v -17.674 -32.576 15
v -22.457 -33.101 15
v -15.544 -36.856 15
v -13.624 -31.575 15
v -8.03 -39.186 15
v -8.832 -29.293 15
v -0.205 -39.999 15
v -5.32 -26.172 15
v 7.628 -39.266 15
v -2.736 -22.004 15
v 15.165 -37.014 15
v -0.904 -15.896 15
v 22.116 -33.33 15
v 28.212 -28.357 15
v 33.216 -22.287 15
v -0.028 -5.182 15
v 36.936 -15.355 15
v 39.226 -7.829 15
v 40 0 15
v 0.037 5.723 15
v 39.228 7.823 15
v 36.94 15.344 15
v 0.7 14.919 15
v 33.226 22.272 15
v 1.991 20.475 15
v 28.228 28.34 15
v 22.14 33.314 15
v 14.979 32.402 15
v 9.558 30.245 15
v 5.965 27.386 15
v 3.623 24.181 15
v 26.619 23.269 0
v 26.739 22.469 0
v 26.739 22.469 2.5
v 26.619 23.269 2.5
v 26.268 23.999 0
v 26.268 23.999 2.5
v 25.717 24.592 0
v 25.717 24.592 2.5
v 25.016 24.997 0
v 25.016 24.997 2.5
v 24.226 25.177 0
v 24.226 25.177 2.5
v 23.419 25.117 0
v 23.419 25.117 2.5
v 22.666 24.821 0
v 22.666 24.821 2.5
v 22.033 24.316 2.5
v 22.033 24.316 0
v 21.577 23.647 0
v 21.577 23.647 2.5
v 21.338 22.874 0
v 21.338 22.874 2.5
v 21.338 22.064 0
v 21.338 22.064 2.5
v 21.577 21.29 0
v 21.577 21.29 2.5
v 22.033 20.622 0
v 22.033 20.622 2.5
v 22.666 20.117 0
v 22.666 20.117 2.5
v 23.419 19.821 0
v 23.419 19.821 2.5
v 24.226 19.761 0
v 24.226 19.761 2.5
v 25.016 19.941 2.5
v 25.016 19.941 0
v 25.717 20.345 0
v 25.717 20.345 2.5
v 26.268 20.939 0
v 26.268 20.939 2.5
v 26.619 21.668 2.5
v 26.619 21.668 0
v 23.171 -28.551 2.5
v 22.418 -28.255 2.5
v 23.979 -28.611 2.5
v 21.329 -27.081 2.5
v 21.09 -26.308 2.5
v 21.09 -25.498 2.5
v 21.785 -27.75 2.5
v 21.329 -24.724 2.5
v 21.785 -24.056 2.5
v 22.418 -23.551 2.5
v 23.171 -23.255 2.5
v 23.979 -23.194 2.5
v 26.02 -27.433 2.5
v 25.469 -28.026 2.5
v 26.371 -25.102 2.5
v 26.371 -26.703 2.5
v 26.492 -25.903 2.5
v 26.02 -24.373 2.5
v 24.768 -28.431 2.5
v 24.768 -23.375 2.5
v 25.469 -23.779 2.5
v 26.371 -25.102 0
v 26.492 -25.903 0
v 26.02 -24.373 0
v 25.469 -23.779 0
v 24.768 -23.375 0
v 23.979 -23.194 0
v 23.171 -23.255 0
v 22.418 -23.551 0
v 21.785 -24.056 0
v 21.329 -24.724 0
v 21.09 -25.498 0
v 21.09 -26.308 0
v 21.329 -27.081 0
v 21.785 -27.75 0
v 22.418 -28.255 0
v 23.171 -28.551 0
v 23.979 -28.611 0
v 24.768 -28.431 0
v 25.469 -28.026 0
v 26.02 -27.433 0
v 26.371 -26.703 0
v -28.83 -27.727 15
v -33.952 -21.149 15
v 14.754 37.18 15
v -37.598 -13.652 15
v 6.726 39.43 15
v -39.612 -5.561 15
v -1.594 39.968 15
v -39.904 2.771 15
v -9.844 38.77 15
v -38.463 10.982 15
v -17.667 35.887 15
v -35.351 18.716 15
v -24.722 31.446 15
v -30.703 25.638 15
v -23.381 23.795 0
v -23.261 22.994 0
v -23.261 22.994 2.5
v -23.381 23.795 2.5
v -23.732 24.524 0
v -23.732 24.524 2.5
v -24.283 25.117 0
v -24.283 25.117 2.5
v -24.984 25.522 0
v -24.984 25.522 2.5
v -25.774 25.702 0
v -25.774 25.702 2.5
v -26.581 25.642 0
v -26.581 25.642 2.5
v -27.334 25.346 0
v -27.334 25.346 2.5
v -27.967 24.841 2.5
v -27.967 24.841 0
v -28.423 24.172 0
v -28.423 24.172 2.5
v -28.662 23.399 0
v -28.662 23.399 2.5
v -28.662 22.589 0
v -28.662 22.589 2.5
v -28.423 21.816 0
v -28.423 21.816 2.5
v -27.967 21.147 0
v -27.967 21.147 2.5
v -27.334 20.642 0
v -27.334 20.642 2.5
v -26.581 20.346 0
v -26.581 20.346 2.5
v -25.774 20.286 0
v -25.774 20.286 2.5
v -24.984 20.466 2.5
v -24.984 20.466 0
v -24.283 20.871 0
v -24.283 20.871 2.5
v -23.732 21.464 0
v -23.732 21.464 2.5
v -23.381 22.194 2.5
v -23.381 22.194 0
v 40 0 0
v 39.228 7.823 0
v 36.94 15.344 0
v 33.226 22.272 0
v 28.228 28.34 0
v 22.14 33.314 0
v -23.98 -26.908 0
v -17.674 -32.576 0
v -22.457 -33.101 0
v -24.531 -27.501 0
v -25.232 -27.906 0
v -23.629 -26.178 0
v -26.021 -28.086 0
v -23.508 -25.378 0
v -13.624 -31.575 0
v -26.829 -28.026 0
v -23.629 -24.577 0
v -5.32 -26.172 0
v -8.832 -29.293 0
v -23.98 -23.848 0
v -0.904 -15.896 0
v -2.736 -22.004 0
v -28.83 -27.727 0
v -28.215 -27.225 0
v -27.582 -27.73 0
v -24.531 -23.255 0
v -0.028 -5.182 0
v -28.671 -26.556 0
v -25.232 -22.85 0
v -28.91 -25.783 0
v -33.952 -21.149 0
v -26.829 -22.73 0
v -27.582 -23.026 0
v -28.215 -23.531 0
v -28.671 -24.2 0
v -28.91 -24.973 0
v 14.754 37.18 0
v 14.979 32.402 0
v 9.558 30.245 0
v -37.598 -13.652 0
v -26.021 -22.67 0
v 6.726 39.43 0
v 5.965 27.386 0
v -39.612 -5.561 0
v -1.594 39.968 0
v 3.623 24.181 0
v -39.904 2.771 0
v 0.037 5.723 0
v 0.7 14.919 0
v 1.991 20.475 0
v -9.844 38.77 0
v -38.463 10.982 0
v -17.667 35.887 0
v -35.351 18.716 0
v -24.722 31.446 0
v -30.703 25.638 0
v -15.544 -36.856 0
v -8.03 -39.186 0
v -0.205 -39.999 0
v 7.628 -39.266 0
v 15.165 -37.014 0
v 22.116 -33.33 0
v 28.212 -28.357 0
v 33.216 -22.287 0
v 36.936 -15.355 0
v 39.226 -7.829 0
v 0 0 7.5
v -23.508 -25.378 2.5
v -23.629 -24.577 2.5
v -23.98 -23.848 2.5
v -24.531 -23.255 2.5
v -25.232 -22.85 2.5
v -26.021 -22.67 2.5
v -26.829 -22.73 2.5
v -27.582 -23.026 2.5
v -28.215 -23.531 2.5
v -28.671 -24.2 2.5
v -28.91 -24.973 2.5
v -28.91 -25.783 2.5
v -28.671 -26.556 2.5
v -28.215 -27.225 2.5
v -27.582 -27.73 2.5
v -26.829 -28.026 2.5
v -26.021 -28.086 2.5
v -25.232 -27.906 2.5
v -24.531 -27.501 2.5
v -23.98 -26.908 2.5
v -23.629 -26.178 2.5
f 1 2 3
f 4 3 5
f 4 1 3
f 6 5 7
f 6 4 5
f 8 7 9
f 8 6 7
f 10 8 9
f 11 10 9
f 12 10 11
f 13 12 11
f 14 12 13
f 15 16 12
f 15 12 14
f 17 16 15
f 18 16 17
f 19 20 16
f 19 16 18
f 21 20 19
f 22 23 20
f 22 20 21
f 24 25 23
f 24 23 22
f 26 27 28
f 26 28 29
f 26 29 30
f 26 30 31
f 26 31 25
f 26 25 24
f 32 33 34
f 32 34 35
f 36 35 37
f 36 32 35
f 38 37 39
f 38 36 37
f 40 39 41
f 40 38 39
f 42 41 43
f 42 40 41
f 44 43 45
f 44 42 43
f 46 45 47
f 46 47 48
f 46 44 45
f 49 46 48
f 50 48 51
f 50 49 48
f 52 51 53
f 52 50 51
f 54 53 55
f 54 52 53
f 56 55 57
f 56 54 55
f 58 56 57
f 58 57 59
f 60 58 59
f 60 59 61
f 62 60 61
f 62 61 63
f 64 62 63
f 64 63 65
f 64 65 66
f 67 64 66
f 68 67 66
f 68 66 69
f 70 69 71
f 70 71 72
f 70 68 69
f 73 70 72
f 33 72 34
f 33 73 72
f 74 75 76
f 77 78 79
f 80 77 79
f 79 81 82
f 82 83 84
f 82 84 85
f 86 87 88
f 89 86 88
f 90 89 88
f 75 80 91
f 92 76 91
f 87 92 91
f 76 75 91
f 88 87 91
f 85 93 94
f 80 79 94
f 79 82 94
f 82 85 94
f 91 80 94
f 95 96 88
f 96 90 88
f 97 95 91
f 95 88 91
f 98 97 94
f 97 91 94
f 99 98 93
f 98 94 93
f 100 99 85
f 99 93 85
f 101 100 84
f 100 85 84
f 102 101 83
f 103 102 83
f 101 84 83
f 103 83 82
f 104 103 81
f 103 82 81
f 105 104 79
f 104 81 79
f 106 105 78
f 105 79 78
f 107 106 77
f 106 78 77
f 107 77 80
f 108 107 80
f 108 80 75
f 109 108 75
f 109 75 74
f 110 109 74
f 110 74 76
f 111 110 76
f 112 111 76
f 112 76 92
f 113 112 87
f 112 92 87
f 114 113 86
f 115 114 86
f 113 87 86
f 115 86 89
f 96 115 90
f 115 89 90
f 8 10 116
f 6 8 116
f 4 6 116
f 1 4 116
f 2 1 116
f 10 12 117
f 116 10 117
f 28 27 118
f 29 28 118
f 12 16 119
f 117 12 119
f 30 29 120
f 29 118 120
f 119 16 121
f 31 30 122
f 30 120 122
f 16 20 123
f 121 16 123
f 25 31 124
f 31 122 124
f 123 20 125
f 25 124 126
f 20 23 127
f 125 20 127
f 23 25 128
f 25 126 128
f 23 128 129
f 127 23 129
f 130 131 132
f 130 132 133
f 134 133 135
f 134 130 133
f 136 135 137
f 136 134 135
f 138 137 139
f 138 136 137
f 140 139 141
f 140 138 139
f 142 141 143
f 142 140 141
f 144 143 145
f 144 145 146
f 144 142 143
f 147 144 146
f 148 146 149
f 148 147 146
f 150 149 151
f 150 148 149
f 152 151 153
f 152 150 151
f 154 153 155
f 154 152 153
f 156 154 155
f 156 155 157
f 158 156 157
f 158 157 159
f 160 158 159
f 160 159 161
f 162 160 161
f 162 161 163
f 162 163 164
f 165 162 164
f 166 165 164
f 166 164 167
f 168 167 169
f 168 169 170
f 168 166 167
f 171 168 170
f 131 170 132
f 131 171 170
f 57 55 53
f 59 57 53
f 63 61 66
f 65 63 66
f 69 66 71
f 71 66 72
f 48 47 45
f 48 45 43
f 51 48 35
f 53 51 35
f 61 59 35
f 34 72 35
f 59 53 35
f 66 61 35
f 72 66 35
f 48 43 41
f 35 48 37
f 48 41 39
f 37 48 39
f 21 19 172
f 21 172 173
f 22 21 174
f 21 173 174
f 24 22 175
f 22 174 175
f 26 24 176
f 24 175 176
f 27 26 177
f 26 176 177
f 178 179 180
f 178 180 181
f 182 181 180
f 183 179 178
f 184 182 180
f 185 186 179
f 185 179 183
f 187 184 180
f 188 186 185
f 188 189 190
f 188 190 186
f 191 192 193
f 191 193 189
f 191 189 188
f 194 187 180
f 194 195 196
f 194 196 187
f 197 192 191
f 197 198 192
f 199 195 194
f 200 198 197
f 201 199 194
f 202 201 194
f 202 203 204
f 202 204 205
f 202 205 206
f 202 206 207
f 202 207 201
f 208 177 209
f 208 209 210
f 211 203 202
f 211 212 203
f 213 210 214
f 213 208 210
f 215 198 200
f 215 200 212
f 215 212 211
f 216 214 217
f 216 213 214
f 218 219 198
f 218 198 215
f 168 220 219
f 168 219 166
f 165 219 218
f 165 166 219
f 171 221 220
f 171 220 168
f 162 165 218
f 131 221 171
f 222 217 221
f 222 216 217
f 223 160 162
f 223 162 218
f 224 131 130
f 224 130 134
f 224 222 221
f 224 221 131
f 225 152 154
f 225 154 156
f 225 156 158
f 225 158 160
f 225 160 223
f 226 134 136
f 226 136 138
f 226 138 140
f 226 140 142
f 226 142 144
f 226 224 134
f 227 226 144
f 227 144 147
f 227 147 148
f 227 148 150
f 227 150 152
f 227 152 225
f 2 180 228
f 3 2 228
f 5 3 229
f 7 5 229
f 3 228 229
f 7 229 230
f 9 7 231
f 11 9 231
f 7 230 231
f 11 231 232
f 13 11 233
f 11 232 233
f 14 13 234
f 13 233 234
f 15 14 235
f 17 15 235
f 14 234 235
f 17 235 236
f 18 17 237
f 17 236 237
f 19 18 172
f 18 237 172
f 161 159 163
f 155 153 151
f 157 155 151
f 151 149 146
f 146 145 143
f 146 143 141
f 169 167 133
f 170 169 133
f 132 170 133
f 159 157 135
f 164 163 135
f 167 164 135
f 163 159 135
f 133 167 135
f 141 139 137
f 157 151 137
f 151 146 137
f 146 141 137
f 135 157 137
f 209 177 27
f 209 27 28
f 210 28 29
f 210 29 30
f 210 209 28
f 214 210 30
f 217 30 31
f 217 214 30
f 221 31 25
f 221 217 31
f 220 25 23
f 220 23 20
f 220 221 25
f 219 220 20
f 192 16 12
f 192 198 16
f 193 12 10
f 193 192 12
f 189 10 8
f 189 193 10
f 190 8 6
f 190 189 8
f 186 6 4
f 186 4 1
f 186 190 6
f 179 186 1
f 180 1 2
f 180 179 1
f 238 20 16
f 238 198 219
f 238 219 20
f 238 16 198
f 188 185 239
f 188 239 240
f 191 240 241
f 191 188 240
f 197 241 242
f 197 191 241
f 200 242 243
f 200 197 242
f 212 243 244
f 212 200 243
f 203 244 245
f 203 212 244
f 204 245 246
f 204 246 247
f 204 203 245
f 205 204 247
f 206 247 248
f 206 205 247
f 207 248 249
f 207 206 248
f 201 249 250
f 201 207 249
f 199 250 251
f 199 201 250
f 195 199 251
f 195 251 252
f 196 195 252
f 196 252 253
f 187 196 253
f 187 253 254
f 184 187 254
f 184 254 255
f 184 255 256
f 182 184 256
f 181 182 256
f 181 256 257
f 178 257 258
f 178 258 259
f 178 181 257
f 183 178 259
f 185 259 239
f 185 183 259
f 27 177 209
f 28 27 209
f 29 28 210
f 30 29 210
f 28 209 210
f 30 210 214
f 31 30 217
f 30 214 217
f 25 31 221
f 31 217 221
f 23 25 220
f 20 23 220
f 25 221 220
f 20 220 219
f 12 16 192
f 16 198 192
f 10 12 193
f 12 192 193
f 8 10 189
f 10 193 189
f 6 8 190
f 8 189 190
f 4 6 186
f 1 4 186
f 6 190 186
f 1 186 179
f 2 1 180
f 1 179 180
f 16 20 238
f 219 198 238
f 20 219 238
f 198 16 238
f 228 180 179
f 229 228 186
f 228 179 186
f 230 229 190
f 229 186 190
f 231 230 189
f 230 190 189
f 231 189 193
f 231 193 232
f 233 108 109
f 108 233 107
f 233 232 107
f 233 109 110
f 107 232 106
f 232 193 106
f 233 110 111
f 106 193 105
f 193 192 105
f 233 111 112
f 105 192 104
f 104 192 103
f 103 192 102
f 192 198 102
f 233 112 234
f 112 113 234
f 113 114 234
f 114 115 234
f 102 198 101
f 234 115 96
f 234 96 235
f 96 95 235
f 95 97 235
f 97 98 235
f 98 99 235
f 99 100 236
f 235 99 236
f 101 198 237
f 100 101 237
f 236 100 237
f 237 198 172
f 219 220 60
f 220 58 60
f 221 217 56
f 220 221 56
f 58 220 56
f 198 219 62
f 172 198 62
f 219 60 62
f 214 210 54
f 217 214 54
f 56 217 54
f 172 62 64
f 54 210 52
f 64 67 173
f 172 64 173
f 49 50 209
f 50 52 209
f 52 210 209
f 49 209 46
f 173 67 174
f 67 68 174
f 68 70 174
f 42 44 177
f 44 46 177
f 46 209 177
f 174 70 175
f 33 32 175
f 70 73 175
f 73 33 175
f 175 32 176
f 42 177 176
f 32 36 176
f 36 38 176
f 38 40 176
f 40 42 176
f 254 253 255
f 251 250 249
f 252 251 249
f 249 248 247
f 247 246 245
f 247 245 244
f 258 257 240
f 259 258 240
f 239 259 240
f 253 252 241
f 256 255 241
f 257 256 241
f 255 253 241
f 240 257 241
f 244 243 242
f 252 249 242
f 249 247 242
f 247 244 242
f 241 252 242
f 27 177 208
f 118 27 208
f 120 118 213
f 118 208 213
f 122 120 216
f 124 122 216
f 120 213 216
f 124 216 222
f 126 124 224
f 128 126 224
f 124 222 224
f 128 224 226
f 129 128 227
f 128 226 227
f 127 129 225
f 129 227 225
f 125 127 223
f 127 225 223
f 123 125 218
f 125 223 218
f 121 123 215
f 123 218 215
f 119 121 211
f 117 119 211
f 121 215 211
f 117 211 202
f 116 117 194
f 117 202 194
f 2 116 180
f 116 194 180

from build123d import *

# Parameters (mm, degrees)
F1_DEPTH = 15
F2_DEPTH = 15
F3_R     = 2.7159146739
F4_DEPTH = 2.5


with BuildPart() as f1:
    # F0 (on Top) → F1 (new body)
    with BuildSketch(Plane.XY):
        with BuildLine():
            ThreePointArc((-22.4566213902, -33.1013618411), (18.7314594251, -35.343067606), (40, 0))
            ThreePointArc((40, 0), (35.2533828755, 18.8997088822), (22.1400502084, 33.313933673))
            add(Edge.make_bspline(
                [(22.1400502084, 33.313933673), (0, 32.687947154), (0, -0.3885608166), (0, -31.9108255208), (-22.4566213902, -33.1013618411)],
                knots=[0, 0, 0, 0, 0.5, 1, 1, 1, 1], degree=3))
        make_face()
    extrude(amount=F1_DEPTH)


with BuildPart() as f2:
    # F0 (on Top) → F2 (new body)
    with BuildSketch(Plane.XY):
        with BuildLine():
            add(Edge.make_bspline(
                [(22.1400502084, 33.313933673), (0, 32.687947154), (0, -0.3885608166), (0, -31.9108255208), (-22.4566213902, -33.1013618411)],
                knots=[0, 0, 0, 0, 0.5, 1, 1, 1, 1], degree=3))
            ThreePointArc((22.1400502084, 33.313933673), (-33.2080249922, 22.2985891059), (-22.4566213902, -33.1013618411))
        make_face()
    extrude(amount=F2_DEPTH)


with BuildPart() as f4_tool:
    # F3 (on Top) → F4 (new body, symmetric)
    with BuildSketch(Plane.XY):
        with Locations((-25.976461919, 22.994065986)):
            Circle(F3_R)
        with Locations((-26.2242592871, -25.377934014)):
            Circle(F3_R)
        with Locations((24.023538081, 22.4688367873)):
            Circle(F3_R)
        with Locations((23.7757407129, -25.9028114378)):
            Circle(F3_R)
    extrude(amount=F4_DEPTH, both=True)


with BuildPart() as f1_1:
    add(f1.part)

    # F4: cut by f4_tool
    add(f4_tool.part, mode=Mode.SUBTRACT)


with BuildPart() as f2_1:
    add(f2.part)

    # F4: cut by f4_tool
    add(f4_tool.part, mode=Mode.SUBTRACT)


solid = Compound([f1_1.part, f2_1.part])
